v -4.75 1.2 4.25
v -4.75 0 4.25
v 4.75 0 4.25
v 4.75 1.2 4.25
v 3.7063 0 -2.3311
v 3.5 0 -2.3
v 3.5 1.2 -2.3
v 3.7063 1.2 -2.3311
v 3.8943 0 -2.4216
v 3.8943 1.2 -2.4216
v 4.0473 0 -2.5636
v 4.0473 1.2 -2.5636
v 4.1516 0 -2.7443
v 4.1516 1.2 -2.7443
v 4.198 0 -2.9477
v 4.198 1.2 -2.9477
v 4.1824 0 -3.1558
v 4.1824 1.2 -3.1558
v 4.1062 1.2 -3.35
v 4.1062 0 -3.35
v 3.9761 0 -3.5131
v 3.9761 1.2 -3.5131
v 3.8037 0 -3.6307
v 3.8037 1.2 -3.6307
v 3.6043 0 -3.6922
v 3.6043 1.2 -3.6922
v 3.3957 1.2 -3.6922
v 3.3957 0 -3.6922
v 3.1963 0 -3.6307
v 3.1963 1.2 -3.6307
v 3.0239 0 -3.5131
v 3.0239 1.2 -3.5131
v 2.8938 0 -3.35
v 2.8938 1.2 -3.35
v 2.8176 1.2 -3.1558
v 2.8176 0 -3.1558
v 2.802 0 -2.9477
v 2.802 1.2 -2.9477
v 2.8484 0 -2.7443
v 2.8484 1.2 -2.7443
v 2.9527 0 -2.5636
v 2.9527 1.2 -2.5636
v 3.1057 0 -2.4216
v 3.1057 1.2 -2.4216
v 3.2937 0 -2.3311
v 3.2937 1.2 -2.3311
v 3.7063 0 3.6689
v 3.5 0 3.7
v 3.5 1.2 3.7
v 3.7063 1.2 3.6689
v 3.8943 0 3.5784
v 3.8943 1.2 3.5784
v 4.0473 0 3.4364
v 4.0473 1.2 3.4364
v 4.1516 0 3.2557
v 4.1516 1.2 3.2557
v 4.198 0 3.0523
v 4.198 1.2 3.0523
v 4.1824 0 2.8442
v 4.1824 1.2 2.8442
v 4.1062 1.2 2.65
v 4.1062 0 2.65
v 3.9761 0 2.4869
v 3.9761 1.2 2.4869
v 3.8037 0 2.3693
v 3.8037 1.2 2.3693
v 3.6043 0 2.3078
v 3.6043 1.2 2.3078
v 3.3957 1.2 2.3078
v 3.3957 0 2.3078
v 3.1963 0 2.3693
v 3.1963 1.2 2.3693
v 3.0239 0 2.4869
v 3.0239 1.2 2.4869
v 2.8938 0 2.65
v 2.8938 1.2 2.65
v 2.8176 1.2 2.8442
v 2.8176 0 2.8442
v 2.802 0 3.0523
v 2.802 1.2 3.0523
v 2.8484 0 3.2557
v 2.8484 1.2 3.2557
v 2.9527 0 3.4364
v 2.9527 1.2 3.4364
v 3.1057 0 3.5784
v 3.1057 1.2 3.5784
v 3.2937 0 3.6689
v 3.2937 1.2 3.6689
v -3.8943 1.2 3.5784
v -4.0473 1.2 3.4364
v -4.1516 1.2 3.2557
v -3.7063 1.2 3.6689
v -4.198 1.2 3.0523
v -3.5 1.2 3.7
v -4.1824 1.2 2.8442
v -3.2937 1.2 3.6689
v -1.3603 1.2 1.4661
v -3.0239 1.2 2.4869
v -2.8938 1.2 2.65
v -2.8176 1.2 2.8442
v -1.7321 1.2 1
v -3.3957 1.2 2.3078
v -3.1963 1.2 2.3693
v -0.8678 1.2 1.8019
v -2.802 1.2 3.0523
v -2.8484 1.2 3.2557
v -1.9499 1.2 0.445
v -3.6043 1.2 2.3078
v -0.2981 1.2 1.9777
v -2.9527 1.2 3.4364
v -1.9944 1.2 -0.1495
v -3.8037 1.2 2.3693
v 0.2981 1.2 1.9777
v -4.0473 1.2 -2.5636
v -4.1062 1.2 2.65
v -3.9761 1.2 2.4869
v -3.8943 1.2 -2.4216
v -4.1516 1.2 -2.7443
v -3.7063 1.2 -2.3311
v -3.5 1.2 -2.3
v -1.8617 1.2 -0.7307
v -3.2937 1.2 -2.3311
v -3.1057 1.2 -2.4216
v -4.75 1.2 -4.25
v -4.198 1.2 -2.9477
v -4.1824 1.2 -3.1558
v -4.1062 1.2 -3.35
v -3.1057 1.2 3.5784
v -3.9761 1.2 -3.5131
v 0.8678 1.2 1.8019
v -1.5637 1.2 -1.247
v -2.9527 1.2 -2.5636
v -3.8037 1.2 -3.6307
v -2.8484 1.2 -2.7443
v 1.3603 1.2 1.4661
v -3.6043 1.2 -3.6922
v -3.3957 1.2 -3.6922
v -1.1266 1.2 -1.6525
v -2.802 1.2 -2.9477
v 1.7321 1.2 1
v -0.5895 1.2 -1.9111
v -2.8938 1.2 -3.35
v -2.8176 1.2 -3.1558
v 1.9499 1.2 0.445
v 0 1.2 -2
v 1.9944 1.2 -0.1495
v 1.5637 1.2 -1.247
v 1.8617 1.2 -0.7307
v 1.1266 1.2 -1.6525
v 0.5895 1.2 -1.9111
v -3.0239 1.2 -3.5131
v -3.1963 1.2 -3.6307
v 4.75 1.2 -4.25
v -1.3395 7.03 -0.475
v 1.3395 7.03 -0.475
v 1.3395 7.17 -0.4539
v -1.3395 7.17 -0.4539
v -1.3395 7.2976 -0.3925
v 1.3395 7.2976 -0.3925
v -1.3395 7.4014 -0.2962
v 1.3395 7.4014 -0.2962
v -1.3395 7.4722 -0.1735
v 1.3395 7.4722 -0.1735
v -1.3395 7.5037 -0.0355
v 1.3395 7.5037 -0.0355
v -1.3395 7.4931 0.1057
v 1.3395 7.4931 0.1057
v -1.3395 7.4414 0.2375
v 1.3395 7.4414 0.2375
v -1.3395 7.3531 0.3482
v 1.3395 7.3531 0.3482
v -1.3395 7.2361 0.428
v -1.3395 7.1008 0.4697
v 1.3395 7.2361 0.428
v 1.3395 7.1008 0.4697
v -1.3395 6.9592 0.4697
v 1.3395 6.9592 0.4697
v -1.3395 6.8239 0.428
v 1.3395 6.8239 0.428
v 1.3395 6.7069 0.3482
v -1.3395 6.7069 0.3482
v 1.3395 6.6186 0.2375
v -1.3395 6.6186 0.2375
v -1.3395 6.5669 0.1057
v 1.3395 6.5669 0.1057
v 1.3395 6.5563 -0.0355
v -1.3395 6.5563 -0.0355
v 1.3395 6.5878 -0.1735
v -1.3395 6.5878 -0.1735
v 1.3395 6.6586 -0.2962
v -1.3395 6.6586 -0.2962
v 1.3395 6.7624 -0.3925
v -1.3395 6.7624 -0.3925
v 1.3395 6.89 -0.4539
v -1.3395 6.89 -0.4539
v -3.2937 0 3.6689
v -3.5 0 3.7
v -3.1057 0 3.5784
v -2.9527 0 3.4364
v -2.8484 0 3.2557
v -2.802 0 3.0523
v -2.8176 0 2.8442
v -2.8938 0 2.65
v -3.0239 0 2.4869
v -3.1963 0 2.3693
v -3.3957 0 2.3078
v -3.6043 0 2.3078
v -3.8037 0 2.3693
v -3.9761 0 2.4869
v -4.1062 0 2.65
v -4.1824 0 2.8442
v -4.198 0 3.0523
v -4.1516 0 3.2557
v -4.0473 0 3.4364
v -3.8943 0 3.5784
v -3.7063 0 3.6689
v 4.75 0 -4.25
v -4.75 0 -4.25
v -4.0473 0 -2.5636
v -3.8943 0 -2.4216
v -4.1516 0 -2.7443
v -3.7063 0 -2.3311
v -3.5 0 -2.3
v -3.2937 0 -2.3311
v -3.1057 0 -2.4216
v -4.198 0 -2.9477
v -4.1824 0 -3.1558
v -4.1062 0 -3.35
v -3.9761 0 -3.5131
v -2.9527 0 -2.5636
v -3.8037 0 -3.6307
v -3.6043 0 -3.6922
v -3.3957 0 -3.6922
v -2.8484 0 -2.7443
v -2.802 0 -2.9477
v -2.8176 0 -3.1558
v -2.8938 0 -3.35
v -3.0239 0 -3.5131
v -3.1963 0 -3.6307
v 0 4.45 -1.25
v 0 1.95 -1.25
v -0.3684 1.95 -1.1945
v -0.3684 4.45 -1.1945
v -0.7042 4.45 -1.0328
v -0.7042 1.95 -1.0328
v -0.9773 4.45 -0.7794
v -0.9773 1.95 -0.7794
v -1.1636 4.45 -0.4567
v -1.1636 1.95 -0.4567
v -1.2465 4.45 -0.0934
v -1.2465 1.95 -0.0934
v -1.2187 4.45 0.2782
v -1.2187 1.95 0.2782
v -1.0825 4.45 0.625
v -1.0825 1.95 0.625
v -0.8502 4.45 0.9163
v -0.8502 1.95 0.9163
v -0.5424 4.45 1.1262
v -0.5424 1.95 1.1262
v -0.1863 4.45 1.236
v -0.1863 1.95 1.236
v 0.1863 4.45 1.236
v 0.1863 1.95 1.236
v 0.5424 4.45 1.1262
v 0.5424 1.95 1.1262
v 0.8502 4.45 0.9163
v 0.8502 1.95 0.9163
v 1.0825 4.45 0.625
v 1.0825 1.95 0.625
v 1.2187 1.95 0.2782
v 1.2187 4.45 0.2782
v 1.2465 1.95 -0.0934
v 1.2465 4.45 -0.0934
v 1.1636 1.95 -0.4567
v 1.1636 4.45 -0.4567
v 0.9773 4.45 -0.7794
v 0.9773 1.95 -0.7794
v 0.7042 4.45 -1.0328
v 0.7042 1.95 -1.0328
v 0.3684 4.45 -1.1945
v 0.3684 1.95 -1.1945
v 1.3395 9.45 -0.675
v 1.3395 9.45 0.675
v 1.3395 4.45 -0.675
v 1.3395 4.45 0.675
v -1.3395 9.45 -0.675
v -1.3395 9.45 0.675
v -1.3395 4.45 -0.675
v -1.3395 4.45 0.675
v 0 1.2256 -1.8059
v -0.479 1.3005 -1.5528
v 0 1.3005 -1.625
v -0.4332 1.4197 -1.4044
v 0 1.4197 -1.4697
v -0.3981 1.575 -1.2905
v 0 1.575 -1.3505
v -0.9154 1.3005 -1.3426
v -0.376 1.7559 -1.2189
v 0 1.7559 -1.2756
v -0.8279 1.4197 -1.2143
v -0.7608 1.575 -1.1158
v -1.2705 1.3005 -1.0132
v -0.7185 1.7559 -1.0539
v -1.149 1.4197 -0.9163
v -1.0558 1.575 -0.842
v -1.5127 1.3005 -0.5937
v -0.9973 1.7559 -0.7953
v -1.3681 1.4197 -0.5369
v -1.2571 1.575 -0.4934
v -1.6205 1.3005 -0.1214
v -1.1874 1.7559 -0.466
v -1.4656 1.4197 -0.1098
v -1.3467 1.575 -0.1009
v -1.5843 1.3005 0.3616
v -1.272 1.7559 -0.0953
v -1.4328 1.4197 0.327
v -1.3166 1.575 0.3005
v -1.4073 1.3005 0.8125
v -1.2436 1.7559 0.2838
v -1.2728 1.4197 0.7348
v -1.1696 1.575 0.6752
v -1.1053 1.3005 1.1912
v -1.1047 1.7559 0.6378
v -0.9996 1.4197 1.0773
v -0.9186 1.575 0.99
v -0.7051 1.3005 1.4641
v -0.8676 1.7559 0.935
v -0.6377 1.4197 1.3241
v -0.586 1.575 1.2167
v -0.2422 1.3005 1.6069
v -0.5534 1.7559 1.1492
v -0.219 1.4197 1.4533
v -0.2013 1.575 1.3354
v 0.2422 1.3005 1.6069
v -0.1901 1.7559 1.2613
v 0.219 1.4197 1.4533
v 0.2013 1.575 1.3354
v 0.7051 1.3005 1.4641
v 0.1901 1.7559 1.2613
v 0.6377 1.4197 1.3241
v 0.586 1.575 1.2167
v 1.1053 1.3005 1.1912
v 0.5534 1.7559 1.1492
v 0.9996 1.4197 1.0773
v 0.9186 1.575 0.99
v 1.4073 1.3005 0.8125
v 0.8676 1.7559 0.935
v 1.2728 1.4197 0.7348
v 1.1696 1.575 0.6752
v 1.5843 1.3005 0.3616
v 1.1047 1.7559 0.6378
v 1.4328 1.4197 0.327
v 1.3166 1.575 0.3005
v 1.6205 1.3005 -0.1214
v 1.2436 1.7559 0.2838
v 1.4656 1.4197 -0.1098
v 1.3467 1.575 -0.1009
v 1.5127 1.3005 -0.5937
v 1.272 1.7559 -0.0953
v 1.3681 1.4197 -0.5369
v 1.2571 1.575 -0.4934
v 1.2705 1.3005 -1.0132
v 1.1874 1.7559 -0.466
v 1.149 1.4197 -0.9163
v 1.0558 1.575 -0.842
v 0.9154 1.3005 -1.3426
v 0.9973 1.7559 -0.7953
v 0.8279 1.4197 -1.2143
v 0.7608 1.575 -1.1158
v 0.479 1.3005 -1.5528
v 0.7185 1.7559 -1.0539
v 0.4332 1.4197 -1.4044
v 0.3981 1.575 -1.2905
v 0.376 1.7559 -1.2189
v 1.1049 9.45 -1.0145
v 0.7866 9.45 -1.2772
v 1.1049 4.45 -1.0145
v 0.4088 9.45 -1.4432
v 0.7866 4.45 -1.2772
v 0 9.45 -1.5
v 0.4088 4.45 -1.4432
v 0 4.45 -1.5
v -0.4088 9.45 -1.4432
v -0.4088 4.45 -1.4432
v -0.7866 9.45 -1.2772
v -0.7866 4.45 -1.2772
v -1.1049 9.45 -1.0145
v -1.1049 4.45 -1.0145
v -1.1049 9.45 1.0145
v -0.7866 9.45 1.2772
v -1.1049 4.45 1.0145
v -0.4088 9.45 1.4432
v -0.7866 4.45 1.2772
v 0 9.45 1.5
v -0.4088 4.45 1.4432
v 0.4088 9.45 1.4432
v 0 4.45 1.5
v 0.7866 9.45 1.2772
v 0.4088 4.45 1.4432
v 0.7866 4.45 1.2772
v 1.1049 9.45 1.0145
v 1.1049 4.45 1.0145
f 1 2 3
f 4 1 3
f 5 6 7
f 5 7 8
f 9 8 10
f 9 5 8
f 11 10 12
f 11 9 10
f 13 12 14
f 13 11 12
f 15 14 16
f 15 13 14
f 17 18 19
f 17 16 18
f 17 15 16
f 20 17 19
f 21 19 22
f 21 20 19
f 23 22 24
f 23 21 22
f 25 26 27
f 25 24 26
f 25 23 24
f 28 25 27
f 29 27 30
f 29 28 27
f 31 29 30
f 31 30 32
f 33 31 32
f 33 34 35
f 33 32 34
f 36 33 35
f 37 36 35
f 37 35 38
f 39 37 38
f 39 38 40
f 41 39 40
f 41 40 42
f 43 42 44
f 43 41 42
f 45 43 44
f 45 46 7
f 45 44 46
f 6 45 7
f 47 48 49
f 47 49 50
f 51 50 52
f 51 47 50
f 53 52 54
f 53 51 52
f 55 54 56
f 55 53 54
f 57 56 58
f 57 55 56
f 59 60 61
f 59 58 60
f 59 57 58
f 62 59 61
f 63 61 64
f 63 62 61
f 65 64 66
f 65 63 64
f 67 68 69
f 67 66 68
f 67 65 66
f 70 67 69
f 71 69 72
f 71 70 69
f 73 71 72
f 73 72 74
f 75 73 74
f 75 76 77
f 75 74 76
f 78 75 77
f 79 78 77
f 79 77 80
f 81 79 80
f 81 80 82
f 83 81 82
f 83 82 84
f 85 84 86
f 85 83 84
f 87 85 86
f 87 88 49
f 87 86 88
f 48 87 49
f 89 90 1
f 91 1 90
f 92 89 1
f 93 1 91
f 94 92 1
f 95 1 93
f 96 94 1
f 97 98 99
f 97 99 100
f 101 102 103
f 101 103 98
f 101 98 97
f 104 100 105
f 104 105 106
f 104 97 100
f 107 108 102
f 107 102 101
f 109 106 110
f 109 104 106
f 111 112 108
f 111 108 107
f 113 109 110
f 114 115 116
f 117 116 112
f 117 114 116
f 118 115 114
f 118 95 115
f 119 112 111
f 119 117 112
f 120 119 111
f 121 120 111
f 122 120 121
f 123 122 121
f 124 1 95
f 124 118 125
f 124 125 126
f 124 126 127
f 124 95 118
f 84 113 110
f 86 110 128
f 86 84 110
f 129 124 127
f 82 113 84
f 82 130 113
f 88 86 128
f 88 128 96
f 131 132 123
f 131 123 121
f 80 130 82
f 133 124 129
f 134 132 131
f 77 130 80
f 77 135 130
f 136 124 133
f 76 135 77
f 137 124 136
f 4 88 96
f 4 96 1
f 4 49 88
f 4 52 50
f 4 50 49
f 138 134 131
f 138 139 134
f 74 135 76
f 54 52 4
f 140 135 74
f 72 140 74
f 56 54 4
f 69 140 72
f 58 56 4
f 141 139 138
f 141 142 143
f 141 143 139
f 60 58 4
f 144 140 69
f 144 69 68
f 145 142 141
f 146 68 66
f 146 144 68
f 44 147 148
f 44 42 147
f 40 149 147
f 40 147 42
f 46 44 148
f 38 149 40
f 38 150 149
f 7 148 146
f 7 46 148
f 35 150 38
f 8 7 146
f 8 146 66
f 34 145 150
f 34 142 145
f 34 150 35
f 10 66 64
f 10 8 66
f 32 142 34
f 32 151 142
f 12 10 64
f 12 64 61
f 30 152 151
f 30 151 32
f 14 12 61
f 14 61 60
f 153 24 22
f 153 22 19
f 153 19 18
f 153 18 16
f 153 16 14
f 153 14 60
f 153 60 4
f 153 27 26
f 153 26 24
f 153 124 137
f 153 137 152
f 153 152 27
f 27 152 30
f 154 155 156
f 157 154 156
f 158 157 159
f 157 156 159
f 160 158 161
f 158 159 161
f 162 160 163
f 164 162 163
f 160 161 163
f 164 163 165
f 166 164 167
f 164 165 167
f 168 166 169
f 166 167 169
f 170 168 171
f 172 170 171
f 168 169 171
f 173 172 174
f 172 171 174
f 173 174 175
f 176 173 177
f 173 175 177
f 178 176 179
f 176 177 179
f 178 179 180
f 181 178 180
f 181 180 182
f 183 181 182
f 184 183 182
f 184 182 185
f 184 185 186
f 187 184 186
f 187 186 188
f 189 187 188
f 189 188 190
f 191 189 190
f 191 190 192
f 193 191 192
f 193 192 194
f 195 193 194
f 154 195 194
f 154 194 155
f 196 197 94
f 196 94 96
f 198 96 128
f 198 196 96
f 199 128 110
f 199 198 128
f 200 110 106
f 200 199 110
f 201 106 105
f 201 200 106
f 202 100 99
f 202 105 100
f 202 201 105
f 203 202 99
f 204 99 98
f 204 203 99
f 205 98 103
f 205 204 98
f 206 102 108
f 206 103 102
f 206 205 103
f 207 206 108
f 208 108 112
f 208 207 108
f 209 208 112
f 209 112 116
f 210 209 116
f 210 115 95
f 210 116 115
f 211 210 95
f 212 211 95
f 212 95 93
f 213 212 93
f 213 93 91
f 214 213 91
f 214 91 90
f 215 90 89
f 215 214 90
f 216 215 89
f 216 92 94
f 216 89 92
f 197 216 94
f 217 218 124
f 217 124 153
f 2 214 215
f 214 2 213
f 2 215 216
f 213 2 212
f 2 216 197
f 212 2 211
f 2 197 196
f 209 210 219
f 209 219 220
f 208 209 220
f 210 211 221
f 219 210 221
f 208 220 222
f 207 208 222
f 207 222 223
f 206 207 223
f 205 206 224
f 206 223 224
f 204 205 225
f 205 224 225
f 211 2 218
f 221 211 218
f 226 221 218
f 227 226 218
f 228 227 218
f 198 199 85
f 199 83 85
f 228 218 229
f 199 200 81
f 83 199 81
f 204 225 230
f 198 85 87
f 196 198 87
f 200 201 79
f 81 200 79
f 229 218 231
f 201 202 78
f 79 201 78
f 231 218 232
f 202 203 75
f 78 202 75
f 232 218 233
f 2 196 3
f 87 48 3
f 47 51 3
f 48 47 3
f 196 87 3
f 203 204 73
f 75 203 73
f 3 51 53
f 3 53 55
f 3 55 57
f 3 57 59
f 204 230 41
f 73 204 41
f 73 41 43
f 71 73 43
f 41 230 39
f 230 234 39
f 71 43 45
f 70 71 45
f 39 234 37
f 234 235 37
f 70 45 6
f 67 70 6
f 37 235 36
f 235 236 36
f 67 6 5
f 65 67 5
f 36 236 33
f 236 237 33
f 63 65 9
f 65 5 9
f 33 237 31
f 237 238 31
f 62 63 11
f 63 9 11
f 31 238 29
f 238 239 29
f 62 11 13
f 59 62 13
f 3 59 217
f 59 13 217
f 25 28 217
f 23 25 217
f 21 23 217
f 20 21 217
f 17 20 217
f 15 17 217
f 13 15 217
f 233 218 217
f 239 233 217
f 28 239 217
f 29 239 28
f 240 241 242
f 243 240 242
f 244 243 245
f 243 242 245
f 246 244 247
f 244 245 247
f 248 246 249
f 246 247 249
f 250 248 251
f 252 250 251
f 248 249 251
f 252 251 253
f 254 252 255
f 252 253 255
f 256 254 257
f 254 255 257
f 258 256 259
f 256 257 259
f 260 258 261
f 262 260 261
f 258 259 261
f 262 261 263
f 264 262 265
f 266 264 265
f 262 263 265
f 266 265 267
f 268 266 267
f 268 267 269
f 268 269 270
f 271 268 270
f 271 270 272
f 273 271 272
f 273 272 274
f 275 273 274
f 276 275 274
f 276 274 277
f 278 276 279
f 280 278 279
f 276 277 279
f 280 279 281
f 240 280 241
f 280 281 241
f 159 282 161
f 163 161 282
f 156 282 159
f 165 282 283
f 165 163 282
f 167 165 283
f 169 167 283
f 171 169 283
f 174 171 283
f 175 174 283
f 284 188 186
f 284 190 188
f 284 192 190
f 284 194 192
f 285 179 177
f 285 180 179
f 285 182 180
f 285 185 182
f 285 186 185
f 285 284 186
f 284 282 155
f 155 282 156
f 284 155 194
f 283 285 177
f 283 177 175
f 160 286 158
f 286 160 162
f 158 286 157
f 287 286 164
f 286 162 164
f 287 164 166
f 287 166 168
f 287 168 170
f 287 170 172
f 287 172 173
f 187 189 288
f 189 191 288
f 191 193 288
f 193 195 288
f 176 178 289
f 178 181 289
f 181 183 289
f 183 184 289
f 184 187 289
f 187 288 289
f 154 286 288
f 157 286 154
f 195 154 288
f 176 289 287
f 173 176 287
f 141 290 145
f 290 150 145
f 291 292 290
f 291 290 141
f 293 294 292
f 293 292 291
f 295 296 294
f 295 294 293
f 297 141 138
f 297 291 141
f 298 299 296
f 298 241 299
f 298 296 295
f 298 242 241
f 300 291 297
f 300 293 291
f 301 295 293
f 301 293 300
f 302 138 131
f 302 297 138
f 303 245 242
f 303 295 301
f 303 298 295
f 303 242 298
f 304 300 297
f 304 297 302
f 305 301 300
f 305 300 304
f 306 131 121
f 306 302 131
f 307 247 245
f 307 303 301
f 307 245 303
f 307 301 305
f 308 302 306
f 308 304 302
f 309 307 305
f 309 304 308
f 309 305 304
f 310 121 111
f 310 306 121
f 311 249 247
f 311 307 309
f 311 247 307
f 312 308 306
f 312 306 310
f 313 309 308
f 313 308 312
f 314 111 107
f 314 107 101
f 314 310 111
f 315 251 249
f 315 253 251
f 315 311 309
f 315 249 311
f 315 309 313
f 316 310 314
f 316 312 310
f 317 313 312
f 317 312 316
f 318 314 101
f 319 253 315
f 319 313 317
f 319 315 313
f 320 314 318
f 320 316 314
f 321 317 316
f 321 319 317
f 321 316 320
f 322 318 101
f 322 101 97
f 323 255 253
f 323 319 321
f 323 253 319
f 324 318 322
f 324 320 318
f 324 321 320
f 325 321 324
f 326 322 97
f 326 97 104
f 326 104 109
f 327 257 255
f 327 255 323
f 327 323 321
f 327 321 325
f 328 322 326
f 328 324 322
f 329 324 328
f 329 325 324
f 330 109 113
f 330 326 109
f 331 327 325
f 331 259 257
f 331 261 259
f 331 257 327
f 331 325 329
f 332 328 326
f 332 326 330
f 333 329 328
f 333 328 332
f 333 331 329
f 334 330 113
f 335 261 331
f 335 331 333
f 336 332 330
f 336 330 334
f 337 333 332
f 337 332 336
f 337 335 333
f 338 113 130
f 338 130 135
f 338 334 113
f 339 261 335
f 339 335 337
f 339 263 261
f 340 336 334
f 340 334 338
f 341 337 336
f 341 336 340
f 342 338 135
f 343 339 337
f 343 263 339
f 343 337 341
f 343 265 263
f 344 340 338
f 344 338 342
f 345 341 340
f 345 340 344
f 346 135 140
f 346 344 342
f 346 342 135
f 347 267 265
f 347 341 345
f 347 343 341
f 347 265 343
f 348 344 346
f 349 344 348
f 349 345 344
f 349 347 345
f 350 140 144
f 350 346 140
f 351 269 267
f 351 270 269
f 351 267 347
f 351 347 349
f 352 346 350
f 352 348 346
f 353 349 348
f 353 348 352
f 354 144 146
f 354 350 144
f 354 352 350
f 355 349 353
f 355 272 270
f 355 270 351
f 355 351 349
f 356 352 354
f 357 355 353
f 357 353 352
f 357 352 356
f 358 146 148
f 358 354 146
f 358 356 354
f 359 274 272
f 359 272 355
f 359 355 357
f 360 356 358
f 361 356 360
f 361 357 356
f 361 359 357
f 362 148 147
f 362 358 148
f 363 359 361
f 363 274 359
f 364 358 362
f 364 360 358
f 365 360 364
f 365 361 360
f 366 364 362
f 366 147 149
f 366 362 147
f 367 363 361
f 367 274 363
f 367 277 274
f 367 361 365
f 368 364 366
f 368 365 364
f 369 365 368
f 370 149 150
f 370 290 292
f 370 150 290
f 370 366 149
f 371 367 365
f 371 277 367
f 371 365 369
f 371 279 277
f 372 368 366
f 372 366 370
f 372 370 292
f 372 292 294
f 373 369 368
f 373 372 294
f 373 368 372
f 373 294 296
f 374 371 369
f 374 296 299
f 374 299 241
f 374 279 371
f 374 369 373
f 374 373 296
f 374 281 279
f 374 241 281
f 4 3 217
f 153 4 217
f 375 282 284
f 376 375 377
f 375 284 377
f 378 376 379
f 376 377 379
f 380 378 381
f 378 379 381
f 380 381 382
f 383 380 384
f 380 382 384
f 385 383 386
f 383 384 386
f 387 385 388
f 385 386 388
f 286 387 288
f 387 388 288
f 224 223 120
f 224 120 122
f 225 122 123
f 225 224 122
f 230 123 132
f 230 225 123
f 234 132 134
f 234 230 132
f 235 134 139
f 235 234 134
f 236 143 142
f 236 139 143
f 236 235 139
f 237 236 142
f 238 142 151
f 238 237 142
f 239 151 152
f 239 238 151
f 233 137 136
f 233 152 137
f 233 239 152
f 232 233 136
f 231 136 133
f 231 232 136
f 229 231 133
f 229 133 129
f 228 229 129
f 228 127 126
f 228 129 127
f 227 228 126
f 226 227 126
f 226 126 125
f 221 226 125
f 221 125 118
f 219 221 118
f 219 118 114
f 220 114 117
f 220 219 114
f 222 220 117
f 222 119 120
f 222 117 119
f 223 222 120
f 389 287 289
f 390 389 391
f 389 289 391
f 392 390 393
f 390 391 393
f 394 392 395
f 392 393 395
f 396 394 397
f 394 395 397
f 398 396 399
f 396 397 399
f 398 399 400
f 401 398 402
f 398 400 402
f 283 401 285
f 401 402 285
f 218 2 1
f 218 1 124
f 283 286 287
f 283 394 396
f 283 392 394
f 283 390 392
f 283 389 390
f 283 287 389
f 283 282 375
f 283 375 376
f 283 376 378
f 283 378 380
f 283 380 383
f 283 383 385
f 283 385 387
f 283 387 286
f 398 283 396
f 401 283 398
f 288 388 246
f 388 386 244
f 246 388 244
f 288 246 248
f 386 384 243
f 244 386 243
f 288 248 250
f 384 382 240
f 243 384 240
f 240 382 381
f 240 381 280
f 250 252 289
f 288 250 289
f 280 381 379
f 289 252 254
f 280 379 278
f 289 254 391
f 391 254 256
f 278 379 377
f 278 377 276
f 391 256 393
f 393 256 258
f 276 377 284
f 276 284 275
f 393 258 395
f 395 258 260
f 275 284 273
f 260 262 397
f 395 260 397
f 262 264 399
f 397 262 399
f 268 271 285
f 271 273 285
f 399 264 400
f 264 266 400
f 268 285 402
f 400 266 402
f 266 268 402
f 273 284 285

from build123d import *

# Parameters (mm, degrees)
SKETCH1_W               = 9.5
SKETCH1_H               = 8.5
BOSS_EXTRUDE1_DEPTH     = 1.2
CUT_EXTRUDE1_DEPTH      = 7.485753619
CUT_EXTRUDE1_DEPTH_BACK = 7.485753619
SKETCH2_R               = 0.7
SKETCH5_R               = 1.25
BOSS_EXTRUDE2_DEPTH     = 3.25
FILLET1_R               = 0.75
SKETCH37_R              = 1.5
BOSS_EXTRUDE3_DEPTH     = 5
CUT_EXTRUDE3_START      = -6
CUT_EXTRUDE3_DEPTH      = 6
SKETCH41_R              = 0.475
CUT_EXTRUDE4_DEPTH      = 10


with BuildPart() as part:
    # Sketch1 → Boss-Extrude1 (new body)
    with BuildSketch(Plane(origin=(0, 0, 0), x_dir=(1, 0, 0), z_dir=(0, 1, 0))):
        Rectangle(SKETCH1_W, SKETCH1_H)
    extrude(amount=BOSS_EXTRUDE1_DEPTH)

    # Sketch2 → Cut-Extrude1 (cut, two sides: drawn at the far end of the back side and taken through both)
    with BuildSketch(Plane(origin=(0, 1.2, 0), x_dir=(1, 0, 0), z_dir=(0, 1, 0)).offset(-CUT_EXTRUDE1_DEPTH_BACK)):
        with Locations(Location((-3.5, -3, 0), (0, 0, 270))):
            Circle(SKETCH2_R)
        with Locations(Location((-3.5, 3, 0), (0, 0, 270))):
            Circle(SKETCH2_R)
        with Locations(Location((3.5, 3, 0), (0, 0, 270))):
            Circle(SKETCH2_R)
        with Locations(Location((3.5, -3, 0), (0, 0, 270))):
            Circle(SKETCH2_R)
    extrude(amount=CUT_EXTRUDE1_DEPTH + CUT_EXTRUDE1_DEPTH_BACK, mode=Mode.SUBTRACT)

    # Sketch5 → Boss-Extrude2 (add)
    with BuildSketch(Plane(origin=(0, 1.2, 0), x_dir=(1, 0, 0), z_dir=(0, 1, 0))):
        with Locations(Location((0, 0, 0), (0, 0, 90))):
            Circle(SKETCH5_R)
    extrude(amount=BOSS_EXTRUDE2_DEPTH)

    # Fillet1
    fillet1_edges = [part.edges().sort_by_distance(p)[0] for p in [
        (0, 1.2, 1.25),
    ]]
    fillet(fillet1_edges, radius=FILLET1_R)

    # Sketch37 → Boss-Extrude3 (add)
    with BuildSketch(Plane(origin=(0, 4.45, 0), x_dir=(1, 0, 0), z_dir=(0, 1, 0))):
        with Locations(Location((0, 0, 0), (0, 0, 270))):
            Circle(SKETCH37_R)
    extrude(amount=BOSS_EXTRUDE3_DEPTH)

    # Sketch40 → Cut-Extrude3 (cut)
    with BuildSketch(Plane(origin=(0, 9.45, 0), x_dir=(1, 0, 0), z_dir=(0, 1, 0)).offset(CUT_EXTRUDE3_START)):
        with BuildLine():
            Line((-1.339542832, 0.675), (-1.339542832, -0.675))
            ThreePointArc((-1.339542832, -0.675), (-1.5, 0), (-1.339542832, 0.675))
        make_face()
        with BuildLine():
            Line((1.339542832, 0.675), (1.339542832, -0.675))
            ThreePointArc((1.339542832, -0.675), (1.5, 0), (1.339542832, 0.675))
        make_face()
    extrude(amount=CUT_EXTRUDE3_DEPTH, mode=Mode.SUBTRACT)

    # Sketch41 → Cut-Extrude4 (cut)
    with BuildSketch(Plane(origin=(1.339542832, 0, 0), x_dir=(0, 0, -1), z_dir=(1, 0, 0))):
        with Locations((0, 7.03)):
            Circle(SKETCH41_R)
    extrude(amount=-CUT_EXTRUDE4_DEPTH, mode=Mode.SUBTRACT)


solid = part.part
